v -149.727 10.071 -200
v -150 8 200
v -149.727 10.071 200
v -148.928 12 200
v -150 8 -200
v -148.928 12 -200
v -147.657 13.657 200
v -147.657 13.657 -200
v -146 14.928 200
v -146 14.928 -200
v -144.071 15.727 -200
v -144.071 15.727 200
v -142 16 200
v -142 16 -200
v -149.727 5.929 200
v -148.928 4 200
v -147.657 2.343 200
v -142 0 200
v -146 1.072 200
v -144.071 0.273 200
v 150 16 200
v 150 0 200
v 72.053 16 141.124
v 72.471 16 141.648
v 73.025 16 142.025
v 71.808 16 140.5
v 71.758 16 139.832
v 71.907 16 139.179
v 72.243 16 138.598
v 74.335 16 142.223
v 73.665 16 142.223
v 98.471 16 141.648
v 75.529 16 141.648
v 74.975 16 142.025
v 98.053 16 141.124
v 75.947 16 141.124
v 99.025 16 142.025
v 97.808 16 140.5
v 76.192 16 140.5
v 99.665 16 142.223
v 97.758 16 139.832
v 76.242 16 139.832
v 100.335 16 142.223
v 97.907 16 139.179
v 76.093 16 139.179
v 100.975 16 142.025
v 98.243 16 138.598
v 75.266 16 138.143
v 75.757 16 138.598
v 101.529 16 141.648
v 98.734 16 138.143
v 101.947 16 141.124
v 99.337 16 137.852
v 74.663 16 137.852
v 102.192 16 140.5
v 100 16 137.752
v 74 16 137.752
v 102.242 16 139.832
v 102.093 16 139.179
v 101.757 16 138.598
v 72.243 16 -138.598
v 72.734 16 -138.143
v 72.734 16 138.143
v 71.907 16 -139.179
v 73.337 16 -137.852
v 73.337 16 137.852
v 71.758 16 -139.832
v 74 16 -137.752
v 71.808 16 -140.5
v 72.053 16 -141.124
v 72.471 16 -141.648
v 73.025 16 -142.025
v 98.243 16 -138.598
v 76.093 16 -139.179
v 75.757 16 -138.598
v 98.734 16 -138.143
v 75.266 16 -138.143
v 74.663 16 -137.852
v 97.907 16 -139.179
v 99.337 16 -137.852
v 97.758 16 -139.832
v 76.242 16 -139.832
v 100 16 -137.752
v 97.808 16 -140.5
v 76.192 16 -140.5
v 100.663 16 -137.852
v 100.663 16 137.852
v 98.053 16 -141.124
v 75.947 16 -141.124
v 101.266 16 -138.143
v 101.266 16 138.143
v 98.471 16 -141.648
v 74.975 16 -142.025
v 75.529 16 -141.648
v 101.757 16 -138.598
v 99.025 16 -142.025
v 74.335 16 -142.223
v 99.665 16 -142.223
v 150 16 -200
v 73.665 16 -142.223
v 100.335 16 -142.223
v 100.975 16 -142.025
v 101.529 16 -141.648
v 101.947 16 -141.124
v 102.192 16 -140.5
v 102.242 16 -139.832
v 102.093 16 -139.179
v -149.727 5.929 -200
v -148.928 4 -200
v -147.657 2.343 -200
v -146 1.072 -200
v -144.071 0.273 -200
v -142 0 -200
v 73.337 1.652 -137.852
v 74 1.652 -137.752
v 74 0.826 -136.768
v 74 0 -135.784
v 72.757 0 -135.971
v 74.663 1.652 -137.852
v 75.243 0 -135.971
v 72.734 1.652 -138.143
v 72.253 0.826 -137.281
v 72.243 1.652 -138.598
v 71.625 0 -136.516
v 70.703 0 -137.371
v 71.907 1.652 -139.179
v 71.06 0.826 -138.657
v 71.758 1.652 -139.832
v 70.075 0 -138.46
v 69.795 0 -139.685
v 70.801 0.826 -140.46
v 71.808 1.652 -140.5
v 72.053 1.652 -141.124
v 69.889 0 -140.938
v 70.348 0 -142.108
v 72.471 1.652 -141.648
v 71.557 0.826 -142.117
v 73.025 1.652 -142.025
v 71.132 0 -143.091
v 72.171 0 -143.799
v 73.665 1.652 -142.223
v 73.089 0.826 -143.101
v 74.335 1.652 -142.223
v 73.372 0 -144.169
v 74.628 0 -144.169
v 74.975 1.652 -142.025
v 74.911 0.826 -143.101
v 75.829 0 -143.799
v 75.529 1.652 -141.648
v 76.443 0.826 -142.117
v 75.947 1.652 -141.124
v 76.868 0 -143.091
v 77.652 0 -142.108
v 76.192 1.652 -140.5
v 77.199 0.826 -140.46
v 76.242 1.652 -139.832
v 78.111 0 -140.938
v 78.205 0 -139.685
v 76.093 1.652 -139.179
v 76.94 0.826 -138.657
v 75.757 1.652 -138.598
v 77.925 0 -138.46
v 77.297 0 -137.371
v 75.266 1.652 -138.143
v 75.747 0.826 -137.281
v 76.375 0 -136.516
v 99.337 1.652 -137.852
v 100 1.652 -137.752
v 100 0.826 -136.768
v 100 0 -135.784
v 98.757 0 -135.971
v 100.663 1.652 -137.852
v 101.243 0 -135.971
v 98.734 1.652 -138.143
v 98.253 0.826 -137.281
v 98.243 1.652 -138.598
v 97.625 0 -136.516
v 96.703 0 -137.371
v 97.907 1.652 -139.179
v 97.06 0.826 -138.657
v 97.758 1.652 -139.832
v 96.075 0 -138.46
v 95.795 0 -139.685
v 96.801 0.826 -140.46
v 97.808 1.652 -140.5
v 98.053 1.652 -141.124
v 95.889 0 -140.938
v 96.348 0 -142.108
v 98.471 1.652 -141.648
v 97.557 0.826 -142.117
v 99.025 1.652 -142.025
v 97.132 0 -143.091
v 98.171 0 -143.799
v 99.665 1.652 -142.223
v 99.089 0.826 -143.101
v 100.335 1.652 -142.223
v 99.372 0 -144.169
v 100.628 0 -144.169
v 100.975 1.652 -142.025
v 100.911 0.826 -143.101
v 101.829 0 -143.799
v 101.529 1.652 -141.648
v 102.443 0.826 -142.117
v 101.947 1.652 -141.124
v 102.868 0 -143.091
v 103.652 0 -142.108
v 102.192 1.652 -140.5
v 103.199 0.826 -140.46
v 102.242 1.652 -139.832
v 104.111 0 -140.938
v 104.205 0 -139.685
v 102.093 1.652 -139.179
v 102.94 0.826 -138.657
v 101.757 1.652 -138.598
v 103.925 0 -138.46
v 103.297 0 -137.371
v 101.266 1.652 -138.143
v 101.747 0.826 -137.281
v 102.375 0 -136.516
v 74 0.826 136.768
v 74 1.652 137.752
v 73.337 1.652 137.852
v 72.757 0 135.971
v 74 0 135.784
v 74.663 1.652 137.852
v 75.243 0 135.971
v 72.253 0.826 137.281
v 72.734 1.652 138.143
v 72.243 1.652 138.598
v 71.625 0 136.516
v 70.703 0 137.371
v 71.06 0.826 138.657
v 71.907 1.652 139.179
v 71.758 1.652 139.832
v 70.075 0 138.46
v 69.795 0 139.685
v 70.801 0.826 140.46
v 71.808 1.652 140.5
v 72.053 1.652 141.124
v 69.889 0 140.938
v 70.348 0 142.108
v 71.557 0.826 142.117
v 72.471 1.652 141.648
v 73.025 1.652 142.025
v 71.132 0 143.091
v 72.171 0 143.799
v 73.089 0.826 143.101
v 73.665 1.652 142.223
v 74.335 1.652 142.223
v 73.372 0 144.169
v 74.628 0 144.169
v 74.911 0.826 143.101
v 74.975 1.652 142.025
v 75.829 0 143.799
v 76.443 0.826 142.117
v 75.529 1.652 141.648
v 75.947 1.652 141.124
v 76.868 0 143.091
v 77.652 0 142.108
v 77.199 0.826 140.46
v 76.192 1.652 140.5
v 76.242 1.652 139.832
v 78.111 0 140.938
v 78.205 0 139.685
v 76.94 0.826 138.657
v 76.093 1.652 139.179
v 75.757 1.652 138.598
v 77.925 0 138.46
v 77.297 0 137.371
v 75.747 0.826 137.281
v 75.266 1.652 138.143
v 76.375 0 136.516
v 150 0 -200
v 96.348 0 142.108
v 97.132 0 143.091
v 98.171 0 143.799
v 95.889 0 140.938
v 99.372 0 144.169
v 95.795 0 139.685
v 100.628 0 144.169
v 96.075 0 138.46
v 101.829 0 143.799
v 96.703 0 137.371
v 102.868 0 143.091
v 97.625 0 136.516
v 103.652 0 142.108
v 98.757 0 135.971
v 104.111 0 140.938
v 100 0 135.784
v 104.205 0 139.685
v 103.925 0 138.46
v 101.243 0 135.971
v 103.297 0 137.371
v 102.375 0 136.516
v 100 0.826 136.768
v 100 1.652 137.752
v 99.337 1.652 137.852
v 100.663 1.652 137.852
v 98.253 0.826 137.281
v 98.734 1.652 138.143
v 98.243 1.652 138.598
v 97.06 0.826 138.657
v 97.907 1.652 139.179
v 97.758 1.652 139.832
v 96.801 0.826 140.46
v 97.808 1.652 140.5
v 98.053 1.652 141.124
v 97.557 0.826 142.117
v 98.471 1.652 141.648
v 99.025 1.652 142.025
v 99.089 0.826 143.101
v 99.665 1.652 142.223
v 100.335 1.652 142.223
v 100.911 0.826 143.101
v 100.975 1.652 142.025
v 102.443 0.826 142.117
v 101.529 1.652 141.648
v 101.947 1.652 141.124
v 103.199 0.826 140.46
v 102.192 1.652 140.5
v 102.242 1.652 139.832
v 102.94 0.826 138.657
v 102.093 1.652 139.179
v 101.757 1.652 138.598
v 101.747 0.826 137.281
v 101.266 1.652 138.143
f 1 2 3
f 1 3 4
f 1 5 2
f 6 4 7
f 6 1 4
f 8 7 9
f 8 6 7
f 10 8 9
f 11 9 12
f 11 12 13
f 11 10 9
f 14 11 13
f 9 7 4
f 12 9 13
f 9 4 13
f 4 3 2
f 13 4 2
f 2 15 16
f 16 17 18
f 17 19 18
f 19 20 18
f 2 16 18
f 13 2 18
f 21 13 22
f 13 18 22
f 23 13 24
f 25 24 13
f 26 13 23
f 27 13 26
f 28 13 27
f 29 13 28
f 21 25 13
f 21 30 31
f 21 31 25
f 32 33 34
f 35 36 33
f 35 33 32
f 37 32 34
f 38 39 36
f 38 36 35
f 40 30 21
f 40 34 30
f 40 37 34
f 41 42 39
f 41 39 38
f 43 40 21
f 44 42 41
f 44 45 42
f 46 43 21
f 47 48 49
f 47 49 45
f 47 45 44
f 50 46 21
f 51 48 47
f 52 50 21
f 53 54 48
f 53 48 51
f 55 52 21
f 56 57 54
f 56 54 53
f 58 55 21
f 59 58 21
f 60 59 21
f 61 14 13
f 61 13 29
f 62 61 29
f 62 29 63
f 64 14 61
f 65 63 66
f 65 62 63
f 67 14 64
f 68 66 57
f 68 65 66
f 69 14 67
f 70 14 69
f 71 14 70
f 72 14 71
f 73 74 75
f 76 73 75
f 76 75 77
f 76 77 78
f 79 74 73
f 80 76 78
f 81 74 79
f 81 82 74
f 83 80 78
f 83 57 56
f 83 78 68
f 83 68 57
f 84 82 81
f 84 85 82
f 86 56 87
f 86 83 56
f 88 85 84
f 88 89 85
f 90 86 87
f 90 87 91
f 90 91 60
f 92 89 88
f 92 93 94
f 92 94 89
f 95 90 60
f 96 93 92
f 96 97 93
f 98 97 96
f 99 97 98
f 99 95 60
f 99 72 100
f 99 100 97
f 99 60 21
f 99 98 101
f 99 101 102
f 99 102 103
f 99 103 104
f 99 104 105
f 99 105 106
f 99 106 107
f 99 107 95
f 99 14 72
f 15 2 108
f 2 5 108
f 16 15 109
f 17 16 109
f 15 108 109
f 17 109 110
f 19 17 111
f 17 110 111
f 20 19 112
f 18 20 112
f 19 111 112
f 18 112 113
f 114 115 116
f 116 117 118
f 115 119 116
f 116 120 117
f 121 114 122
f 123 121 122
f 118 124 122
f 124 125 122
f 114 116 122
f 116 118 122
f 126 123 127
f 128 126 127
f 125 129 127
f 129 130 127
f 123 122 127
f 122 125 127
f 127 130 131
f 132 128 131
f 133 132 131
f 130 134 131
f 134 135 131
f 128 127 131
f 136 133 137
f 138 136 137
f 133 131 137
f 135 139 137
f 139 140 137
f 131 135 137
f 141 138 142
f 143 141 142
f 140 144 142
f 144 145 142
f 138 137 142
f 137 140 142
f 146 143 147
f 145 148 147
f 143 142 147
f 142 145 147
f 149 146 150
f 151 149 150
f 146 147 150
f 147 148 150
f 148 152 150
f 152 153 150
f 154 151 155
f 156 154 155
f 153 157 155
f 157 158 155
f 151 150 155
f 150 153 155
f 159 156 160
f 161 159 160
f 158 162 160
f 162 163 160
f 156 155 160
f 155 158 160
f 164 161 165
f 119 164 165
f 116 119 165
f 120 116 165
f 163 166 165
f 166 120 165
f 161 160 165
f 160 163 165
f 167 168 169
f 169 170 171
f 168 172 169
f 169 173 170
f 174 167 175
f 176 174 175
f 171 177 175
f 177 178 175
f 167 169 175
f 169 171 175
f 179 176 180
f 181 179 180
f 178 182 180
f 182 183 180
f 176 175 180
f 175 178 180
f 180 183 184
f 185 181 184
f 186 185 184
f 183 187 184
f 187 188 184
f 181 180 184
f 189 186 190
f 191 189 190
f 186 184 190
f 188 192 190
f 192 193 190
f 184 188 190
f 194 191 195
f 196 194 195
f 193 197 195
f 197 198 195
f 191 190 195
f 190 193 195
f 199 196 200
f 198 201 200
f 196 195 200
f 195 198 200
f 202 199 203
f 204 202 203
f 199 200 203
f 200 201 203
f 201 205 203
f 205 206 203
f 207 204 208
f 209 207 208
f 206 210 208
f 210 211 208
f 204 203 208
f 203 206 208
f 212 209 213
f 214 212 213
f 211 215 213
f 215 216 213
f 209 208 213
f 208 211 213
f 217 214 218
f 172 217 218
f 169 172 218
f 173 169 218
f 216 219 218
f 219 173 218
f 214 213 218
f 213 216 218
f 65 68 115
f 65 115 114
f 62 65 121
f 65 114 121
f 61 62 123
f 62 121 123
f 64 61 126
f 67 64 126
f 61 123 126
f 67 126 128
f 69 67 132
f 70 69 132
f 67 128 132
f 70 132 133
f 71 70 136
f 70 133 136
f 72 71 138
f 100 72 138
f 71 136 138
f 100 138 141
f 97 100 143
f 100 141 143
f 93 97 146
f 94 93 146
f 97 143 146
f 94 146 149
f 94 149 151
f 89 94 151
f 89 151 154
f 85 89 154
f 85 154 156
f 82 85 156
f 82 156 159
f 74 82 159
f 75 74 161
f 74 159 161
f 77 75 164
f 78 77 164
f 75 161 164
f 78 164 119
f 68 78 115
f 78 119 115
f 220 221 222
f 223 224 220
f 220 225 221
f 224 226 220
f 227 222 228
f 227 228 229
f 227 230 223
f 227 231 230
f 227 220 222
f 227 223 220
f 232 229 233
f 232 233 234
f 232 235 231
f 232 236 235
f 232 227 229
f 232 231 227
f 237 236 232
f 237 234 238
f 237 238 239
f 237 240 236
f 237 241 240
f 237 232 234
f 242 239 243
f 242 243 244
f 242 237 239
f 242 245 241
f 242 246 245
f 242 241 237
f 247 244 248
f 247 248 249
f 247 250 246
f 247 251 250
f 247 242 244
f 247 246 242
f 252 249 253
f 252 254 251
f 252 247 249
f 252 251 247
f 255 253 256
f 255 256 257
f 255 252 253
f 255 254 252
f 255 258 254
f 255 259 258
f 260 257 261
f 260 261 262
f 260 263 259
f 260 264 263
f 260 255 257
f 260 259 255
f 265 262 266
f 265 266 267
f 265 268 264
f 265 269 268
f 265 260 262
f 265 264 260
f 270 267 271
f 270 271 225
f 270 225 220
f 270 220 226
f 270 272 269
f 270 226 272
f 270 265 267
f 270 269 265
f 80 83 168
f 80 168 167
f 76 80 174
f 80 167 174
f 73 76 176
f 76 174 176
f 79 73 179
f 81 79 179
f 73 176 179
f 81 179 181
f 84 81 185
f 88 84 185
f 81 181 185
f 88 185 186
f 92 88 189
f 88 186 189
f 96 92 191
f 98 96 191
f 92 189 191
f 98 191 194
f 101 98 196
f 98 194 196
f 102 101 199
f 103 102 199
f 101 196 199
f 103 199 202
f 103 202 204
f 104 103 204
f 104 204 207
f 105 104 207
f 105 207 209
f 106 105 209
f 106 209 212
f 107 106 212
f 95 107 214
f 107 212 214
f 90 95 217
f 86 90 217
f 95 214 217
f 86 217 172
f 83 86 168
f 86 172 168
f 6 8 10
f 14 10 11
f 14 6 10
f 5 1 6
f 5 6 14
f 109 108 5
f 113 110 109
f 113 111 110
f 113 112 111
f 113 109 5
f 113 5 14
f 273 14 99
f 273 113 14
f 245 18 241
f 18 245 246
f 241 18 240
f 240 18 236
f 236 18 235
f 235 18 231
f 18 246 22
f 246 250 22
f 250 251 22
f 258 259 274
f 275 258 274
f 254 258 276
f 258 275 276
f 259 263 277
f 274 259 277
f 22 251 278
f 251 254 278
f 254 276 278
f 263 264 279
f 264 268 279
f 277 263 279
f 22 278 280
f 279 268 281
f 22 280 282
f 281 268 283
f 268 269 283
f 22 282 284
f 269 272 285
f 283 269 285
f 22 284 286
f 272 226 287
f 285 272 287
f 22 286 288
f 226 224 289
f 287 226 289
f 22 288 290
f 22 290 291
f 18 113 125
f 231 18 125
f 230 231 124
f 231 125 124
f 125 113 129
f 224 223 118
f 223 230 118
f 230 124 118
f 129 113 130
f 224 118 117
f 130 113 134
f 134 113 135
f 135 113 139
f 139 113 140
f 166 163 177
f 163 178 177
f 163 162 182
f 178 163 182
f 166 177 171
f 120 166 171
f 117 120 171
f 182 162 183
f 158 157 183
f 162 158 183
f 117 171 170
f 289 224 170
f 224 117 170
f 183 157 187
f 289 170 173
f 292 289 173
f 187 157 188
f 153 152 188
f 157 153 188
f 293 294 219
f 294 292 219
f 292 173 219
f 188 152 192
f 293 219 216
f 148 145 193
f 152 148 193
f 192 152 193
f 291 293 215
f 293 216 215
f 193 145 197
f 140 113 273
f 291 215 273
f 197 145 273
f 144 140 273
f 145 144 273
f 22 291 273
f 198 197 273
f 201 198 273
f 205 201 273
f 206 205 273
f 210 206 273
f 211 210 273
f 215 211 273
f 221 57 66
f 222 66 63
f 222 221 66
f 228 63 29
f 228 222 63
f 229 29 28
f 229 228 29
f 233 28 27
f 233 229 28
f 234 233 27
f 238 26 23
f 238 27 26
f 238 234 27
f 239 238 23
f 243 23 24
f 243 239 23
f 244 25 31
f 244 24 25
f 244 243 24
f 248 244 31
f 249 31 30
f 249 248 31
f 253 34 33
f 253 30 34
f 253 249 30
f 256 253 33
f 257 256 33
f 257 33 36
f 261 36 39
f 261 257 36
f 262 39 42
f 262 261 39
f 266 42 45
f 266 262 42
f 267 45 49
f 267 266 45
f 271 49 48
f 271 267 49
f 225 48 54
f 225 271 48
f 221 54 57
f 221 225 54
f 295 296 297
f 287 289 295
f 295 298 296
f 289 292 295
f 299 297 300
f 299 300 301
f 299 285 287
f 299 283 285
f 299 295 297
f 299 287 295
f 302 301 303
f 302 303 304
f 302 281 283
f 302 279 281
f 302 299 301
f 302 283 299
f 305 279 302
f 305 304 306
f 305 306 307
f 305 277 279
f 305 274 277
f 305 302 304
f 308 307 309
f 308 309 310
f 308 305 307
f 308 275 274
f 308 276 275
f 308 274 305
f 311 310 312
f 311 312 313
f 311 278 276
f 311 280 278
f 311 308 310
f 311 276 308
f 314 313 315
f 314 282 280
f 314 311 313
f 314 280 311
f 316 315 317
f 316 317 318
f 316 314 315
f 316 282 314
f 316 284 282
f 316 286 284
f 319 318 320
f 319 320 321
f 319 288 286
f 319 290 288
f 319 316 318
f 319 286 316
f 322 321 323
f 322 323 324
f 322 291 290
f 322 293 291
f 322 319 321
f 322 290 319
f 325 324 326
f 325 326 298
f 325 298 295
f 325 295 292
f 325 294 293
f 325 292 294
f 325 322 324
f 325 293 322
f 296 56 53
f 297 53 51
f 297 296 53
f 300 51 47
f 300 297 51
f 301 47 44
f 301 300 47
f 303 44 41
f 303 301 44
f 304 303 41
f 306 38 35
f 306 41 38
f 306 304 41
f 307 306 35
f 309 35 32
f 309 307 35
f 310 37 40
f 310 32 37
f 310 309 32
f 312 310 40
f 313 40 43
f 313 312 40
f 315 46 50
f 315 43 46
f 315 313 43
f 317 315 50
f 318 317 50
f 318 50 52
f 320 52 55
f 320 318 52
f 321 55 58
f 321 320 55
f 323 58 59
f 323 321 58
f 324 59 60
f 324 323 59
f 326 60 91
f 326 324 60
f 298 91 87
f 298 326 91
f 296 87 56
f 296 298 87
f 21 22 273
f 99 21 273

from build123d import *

# Parameters (mm, degrees)
SKETCH1_W                                 = 300
SKETCH1_H                                 = 400
BOSS_EXTRUDE1_DEPTH                       = 16
CSK_FOR_8_FLAT_HEAD_MACHINE_SCREW_2_COUNT = 2
CSK_FOR_8_FLAT_HEAD_MACHINE_SCREW_2_PITCH = 26
FILLET1_R                                 = 8


with BuildPart() as part:
    # Sketch1 → Boss-Extrude1 (new body)
    with BuildSketch(Plane(origin=(0, 0, 0), x_dir=(1, 0, 0), z_dir=(0, 1, 0))):
        Rectangle(SKETCH1_W, SKETCH1_H)
    extrude(amount=BOSS_EXTRUDE1_DEPTH)

    # Sketch8 → CSK for #8 Flat Head Machine Screw (100)1 (revolve, cut)
    with BuildSketch(Plane(origin=(100, 0, 140), x_dir=(0, 0, -1), z_dir=(1, 0, 0))):
        Polygon((0, 0), (0, 26.350674586), (2.2479, 25), (2.2479, 1.651767624), (4.2164, 0), align=None)
    csk_for_8_flat_head_machine_screw_100 = revolve(axis=Axis((100, -6.35, 140), (0, 1, 0)), mode=Mode.SUBTRACT)

    # CSK for _8 Flat Head Machine Screw _ 2: CSK for #8 Flat Head Machine Screw (100)1 ×2
    with Locations(*[(-i * CSK_FOR_8_FLAT_HEAD_MACHINE_SCREW_2_PITCH, 0, 0) for i in range(1, CSK_FOR_8_FLAT_HEAD_MACHINE_SCREW_2_COUNT)]):
        add(csk_for_8_flat_head_machine_screw_100, mode=Mode.SUBTRACT)

    # Mirror1: CSK for #8 Flat Head Machine Screw (100)1 across plane
    add(csk_for_8_flat_head_machine_screw_100.mirror(Plane.XY), mode=Mode.SUBTRACT)

    # Mirror1 copy 1 sketch → Mirror1 copy 1 (revolve, cut)
    with BuildSketch(Plane(origin=(74, 0, -140), x_dir=(0, 0, 1), z_dir=(1, 0, 0))):
        Polygon((0, 0), (0, -26.350674586), (2.2479, -25), (2.2479, -1.651767624), (4.2164, 0), align=None)
    revolve(axis=Axis((74, -6.35, -140), (0, -1, 0)), mode=Mode.SUBTRACT)

    # Fillet1
    fillet1_edges = [part.edges().sort_by_distance(p)[0] for p in [
        (-150, 16, 0),
        (-150, 0, 0),
    ]]
    fillet(fillet1_edges, radius=FILLET1_R - 0.0001)  # a hair under: the kernel refuses the full size


solid = part.part
